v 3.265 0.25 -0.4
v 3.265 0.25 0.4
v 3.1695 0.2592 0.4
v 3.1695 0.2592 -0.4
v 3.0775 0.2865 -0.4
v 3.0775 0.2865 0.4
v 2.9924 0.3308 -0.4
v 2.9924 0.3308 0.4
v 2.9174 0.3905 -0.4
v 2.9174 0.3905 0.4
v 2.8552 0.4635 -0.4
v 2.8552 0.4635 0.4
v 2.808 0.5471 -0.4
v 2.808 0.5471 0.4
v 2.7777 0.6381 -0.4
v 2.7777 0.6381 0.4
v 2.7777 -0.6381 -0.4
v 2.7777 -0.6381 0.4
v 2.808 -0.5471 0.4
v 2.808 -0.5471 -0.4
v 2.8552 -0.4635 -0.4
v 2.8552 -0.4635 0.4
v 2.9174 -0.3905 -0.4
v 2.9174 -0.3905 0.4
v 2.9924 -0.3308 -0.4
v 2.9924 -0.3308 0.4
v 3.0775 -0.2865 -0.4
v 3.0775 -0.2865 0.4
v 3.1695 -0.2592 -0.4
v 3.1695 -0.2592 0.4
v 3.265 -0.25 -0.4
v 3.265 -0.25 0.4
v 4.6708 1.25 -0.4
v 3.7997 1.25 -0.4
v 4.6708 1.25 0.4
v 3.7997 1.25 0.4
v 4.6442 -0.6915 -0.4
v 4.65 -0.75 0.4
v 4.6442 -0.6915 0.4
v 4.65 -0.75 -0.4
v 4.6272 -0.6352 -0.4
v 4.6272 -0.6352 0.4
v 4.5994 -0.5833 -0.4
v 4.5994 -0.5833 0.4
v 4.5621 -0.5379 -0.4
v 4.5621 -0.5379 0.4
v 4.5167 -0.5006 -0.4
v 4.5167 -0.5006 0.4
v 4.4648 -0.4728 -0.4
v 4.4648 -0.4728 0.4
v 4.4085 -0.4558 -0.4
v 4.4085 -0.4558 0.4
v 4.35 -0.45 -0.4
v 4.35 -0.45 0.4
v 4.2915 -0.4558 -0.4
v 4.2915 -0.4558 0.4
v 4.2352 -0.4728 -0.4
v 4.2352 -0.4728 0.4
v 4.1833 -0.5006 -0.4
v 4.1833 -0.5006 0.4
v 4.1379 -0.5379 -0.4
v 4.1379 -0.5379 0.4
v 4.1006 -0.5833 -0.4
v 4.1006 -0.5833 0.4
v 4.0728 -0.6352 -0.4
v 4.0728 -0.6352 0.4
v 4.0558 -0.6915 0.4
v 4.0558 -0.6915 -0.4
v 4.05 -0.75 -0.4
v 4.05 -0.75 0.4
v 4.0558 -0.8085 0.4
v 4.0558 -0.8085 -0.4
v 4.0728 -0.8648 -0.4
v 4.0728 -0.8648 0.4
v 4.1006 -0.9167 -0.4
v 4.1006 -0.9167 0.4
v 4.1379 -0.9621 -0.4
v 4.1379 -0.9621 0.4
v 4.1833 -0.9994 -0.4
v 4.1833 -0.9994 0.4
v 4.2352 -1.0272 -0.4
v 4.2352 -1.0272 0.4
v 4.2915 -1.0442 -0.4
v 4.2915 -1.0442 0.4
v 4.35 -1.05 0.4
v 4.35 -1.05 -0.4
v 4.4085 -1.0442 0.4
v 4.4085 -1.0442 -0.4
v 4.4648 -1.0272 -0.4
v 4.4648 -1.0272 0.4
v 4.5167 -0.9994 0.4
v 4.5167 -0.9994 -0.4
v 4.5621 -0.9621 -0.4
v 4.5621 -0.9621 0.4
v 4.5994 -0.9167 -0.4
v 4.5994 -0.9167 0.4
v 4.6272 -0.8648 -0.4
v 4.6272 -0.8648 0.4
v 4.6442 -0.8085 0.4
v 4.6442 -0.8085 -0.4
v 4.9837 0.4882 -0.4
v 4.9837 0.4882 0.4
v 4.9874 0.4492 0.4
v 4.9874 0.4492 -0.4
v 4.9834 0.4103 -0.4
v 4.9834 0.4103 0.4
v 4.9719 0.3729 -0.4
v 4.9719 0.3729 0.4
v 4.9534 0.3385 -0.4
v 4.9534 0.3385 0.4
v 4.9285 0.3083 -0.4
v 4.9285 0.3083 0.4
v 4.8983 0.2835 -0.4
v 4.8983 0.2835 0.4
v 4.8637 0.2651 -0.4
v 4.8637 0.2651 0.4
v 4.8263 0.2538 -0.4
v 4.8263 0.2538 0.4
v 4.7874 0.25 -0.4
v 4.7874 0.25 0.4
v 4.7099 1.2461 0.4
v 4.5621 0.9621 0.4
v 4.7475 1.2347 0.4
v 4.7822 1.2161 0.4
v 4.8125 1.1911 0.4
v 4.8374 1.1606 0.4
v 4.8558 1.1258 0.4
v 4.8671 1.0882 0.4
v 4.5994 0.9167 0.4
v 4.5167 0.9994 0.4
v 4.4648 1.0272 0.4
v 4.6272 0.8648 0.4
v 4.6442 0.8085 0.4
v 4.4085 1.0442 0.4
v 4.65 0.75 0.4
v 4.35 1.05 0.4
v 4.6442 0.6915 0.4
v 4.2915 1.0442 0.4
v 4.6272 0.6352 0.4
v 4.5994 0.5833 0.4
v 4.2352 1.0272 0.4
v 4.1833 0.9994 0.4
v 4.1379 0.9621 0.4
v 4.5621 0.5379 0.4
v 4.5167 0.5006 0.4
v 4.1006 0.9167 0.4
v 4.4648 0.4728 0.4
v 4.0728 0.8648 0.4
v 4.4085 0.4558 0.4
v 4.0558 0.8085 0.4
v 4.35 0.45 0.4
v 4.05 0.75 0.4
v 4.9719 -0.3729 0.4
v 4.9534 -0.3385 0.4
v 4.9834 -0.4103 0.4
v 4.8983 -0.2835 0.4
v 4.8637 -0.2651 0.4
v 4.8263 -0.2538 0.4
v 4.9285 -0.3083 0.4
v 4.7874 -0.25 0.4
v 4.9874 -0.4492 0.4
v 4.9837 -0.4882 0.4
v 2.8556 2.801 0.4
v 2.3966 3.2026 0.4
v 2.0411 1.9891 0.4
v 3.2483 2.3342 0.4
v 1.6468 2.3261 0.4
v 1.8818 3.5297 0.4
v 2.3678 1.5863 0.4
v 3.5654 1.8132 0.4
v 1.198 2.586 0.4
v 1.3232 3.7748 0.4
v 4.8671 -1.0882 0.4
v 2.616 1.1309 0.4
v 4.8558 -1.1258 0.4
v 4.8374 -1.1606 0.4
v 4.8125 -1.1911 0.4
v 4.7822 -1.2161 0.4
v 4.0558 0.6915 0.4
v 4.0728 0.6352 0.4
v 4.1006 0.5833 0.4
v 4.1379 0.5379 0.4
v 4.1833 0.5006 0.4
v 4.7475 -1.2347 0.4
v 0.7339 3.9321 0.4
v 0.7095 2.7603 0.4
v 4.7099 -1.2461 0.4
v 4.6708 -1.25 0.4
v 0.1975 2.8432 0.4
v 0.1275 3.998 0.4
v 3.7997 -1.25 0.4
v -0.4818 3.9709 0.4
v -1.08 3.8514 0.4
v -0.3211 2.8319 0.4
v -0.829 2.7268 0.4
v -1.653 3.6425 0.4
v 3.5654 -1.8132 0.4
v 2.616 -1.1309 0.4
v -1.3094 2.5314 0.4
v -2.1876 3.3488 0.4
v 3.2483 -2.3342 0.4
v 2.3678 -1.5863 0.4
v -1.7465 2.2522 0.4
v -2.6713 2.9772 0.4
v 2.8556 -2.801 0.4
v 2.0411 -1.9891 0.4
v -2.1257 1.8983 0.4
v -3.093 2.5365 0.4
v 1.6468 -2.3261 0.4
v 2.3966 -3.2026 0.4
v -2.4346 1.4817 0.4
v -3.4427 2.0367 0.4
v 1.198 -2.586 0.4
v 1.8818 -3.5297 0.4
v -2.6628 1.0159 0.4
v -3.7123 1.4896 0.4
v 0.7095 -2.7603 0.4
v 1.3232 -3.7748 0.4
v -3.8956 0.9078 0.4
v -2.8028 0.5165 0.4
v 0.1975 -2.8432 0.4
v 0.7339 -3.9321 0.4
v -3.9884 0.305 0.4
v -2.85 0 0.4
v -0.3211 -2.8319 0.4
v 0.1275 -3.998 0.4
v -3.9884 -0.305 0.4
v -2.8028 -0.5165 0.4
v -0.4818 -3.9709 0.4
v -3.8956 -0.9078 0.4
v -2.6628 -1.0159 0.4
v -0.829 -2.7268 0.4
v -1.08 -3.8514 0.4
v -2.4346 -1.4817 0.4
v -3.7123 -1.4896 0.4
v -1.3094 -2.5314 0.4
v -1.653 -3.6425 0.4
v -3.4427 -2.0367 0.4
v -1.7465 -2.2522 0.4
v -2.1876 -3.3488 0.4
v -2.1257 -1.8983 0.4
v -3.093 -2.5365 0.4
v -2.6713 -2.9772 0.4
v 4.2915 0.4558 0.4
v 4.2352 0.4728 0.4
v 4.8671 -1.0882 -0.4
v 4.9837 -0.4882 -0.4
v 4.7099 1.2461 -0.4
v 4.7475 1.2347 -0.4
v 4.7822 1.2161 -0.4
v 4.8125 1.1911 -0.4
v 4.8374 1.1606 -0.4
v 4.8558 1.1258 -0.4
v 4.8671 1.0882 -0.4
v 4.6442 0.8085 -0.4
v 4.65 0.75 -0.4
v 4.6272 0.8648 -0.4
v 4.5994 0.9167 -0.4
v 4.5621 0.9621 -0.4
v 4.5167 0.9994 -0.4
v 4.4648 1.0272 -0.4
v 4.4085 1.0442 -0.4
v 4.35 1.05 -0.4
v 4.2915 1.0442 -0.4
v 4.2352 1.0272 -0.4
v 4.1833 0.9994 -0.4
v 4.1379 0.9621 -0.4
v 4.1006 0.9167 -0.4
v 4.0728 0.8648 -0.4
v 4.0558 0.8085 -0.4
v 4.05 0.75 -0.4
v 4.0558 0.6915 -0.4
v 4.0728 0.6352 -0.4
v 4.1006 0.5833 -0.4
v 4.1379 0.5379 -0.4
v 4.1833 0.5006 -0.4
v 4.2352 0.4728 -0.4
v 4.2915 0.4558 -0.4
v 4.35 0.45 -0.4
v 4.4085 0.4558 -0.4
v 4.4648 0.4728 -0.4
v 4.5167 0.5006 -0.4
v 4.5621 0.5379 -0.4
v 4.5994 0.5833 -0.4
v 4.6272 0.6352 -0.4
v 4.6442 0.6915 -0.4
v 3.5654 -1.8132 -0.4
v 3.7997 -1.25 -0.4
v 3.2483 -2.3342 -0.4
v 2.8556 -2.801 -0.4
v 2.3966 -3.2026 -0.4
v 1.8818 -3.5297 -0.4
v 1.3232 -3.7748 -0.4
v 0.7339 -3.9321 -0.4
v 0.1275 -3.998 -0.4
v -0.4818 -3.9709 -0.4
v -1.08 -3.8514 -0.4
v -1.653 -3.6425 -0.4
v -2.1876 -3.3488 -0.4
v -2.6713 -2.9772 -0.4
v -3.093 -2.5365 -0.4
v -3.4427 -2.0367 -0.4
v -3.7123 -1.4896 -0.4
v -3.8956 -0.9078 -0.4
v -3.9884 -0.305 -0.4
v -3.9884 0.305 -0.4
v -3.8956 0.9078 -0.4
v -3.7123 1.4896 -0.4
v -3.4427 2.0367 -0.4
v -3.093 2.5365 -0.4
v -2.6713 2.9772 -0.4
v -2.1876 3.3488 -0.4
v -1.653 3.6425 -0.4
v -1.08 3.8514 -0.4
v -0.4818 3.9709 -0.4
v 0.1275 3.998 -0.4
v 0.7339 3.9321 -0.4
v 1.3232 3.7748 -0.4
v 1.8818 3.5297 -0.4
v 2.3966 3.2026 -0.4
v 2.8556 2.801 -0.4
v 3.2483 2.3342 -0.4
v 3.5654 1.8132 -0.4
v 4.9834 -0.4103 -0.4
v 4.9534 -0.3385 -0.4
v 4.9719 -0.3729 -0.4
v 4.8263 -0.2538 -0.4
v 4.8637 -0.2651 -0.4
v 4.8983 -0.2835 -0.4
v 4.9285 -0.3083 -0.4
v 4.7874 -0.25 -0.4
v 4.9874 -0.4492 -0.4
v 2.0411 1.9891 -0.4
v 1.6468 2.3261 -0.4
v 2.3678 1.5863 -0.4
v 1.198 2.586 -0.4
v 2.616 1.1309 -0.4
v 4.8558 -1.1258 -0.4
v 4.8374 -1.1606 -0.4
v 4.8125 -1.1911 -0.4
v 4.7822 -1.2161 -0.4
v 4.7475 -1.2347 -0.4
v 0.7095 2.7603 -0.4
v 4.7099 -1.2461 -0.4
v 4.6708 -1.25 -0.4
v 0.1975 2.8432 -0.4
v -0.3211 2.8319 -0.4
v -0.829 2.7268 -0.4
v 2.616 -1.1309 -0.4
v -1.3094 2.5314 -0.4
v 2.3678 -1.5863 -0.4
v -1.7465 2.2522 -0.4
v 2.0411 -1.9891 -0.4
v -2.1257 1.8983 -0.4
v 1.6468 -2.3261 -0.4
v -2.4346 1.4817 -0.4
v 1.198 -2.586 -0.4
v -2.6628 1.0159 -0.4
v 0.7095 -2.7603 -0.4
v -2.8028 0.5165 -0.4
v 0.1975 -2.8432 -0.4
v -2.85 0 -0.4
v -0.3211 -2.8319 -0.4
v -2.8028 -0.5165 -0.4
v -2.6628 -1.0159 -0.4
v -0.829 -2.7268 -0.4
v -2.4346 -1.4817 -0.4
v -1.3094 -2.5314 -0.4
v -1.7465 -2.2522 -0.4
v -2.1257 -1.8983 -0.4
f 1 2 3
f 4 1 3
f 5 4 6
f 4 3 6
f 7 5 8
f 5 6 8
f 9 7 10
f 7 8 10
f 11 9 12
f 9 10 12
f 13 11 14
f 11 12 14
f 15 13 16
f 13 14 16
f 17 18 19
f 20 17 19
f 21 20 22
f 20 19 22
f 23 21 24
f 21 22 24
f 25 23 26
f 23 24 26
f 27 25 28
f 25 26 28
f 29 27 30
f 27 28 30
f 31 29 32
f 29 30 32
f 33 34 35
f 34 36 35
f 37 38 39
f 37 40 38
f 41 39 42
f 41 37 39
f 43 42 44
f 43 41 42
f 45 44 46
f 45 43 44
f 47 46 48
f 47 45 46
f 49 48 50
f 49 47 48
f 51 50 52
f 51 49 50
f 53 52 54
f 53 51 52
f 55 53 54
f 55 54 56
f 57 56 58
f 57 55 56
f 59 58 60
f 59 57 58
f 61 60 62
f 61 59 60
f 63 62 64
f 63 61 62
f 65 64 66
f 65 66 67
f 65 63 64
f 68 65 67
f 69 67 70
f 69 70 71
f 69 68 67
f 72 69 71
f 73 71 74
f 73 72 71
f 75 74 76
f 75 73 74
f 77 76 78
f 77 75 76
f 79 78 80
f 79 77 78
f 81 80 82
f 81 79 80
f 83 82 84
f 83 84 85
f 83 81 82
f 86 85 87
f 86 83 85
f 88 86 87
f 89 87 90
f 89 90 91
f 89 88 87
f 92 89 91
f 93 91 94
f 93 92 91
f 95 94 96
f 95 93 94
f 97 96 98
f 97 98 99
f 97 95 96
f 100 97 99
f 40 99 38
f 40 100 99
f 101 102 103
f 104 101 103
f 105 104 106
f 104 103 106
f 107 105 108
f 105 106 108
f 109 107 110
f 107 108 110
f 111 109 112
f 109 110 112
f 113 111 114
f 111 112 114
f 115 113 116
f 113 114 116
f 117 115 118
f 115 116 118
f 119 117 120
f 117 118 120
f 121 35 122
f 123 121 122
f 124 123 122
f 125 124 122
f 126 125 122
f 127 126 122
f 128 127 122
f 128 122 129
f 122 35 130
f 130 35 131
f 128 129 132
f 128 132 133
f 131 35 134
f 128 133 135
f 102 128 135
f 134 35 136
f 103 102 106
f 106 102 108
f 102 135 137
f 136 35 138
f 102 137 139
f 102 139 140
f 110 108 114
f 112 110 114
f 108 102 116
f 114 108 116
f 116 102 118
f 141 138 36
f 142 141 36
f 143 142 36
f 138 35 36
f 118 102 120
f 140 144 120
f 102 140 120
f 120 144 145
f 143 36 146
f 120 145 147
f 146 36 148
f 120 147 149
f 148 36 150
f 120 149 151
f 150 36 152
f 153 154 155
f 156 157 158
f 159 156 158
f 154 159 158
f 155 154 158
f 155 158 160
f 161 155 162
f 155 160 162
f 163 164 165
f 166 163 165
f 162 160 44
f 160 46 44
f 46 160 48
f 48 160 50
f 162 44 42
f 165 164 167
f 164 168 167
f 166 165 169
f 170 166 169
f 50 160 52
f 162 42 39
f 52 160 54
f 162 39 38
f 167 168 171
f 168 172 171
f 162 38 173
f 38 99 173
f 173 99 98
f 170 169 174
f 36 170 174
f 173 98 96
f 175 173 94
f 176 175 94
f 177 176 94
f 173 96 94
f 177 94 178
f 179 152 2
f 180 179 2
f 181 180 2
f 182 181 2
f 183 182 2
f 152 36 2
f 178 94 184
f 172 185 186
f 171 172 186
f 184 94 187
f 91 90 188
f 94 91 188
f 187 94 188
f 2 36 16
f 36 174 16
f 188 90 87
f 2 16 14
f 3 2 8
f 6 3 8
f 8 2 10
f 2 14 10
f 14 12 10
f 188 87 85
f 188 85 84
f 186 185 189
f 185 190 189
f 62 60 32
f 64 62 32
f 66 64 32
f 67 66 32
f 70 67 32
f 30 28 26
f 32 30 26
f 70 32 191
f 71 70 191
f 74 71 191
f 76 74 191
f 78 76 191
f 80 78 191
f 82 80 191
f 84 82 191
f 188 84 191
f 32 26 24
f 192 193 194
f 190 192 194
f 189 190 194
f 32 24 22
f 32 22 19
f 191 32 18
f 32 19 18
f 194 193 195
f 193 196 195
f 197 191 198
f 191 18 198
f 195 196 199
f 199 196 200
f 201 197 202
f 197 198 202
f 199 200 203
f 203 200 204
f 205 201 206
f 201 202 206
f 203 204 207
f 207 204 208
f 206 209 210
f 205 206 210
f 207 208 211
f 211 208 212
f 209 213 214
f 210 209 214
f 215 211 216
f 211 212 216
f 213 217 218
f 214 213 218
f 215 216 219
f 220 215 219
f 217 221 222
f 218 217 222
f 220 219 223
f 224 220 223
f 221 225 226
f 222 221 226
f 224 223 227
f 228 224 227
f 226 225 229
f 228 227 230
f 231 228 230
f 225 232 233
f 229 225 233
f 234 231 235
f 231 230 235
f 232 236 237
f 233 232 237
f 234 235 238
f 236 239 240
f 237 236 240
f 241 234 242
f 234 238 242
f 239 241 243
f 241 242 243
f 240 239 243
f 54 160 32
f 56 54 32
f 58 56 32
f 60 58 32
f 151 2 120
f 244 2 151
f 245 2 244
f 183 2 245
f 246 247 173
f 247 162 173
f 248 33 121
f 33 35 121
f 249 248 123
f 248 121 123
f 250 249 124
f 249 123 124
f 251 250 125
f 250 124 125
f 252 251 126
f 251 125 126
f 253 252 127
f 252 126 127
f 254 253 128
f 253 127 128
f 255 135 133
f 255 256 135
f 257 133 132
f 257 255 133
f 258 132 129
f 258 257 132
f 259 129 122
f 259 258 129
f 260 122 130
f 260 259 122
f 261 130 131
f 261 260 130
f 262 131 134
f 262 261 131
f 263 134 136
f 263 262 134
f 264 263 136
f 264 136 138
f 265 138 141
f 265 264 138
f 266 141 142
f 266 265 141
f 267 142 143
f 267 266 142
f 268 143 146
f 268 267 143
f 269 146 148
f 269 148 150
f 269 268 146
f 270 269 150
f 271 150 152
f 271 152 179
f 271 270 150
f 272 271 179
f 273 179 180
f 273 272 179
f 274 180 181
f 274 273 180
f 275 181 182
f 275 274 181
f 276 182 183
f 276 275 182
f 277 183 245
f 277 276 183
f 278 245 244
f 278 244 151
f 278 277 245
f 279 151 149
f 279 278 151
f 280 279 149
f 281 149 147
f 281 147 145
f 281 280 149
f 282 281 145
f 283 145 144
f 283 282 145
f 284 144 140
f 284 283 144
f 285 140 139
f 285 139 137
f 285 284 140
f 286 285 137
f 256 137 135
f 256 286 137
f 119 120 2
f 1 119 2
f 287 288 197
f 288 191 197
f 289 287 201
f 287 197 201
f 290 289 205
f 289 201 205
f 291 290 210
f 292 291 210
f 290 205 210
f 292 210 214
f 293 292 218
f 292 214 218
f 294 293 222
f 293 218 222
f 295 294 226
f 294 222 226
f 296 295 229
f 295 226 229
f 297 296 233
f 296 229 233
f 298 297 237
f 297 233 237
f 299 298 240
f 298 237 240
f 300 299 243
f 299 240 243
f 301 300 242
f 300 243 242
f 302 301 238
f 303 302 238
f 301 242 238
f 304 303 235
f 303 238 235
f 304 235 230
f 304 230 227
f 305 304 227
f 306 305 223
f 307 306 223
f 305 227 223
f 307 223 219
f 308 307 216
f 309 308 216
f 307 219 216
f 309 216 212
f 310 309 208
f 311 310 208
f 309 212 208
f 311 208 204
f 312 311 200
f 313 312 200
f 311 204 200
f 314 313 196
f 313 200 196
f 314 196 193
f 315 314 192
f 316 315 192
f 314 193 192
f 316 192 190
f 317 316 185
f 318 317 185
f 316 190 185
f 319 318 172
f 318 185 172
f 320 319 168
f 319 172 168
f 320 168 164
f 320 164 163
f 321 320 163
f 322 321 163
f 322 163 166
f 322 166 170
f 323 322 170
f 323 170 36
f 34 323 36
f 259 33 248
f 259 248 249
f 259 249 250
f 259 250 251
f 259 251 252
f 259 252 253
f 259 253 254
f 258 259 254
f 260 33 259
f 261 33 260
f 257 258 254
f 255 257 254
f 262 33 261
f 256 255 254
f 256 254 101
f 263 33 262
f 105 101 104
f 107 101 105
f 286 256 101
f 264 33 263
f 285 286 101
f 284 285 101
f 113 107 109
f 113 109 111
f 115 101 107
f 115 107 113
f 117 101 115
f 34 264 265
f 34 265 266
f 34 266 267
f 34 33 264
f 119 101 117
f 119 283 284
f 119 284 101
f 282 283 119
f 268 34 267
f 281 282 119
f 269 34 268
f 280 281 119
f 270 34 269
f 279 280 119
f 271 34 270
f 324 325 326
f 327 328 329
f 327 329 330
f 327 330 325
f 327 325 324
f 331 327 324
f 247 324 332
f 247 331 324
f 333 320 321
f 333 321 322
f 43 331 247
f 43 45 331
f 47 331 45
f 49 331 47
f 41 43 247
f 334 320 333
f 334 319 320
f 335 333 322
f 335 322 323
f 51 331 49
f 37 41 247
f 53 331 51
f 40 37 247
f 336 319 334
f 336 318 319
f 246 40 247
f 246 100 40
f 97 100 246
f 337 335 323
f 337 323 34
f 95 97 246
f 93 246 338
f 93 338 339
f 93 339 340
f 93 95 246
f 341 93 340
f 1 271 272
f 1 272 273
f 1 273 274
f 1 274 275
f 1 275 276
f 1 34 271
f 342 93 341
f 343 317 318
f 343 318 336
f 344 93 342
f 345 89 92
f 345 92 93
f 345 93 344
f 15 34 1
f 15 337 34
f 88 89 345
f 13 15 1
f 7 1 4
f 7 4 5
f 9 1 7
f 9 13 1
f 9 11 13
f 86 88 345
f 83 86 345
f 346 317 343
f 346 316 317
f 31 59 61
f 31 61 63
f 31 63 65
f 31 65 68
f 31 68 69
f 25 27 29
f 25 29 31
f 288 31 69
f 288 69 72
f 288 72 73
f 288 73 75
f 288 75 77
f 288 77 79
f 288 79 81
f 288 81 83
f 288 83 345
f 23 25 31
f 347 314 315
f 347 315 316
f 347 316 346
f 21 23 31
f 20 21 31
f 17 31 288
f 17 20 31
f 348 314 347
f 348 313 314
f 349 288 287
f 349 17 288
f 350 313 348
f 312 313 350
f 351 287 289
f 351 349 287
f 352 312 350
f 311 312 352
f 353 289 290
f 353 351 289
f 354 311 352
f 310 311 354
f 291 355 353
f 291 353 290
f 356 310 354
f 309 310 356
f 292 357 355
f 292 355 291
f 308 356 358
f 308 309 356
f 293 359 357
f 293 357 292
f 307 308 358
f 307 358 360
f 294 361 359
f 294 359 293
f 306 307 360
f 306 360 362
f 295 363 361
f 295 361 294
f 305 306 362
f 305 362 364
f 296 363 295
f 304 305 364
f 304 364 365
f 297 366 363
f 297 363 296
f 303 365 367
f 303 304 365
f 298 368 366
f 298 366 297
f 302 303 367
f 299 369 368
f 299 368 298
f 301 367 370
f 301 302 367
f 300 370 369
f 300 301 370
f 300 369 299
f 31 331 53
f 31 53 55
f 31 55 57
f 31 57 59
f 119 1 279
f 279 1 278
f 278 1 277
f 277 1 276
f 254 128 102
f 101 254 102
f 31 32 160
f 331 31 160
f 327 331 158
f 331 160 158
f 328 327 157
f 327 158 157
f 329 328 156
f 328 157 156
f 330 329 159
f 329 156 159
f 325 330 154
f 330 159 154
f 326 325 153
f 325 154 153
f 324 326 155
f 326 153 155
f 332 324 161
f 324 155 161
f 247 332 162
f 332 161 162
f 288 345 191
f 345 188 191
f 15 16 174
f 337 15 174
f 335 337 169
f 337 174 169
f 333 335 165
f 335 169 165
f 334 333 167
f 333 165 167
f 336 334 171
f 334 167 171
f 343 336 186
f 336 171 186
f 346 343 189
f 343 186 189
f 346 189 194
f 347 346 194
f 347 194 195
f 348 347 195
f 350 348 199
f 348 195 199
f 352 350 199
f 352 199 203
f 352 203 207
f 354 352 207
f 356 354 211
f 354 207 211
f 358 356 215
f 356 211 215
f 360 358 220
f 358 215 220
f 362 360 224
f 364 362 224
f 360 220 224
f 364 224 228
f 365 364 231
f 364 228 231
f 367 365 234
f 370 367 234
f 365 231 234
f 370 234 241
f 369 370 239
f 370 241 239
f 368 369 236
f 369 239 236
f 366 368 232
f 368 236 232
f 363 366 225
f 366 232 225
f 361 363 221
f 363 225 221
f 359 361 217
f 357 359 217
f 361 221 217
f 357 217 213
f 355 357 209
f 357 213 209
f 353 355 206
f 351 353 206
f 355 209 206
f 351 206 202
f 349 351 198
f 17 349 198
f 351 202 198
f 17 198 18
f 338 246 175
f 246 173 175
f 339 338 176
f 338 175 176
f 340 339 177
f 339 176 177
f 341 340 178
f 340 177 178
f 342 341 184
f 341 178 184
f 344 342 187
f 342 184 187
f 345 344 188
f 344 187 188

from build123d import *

# Parameters (mm, degrees)
SKETCH1_R           = 0.3
BOSS_EXTRUDE1_DEPTH = 0.4


with BuildPart() as part:
    # Sketch1 → Boss-Extrude1 (new, symmetric)
    with BuildSketch(Plane(origin=(0, 0, 0), x_dir=(0, 1, 0), z_dir=(0, 0, 1))):
        with BuildLine():
            Line((-0.25, -3.264965543), (-0.25, -4.787380599))
            ThreePointArc((-0.25, -4.787380599), (-0.322784356, -4.941705516), (-0.488161799, -4.983706036))
            Line((-0.488161799, -4.983706036), (-1.088161799, -4.86707785))
            ThreePointArc((-1.088161799, -4.86707785), (-1.204324917, -4.797968058), (-1.25, -4.670752414))
            Line((-1.25, -4.670752414), (-1.25, -3.799671038))
            ThreePointArc((-1.25, -3.799671038), (0, 4), (1.25, -3.799671038))
            Line((1.25, -3.799671038), (1.25, -4.670752414))
            ThreePointArc((1.25, -4.670752414), (1.204324917, -4.797968058), (1.088161799, -4.86707785))
            Line((1.088161799, -4.86707785), (0.488161799, -4.983706036))
            ThreePointArc((0.488161799, -4.983706036), (0.322784356, -4.941705516), (0.25, -4.787380599))
            Line((0.25, -4.787380599), (0.25, -3.264965543))
            ThreePointArc((0.25, -3.264965543), (0.358866935, -2.953493353), (0.638059701, -2.777657253))
            ThreePointArc((0.638059701, -2.777657253), (0, 2.85), (-0.638059701, -2.777657253))
            ThreePointArc((-0.638059701, -2.777657253), (-0.358866935, -2.953493353), (-0.25, -3.264965543))
        make_face()
        with Locations(Location((0.75, -4.35, 0), (0, 0, 270))):
            Circle(SKETCH1_R, mode=Mode.SUBTRACT)
        with Locations(Location((-0.75, -4.35, 0), (0, 0, 270))):
            Circle(SKETCH1_R, mode=Mode.SUBTRACT)
    extrude(amount=BOSS_EXTRUDE1_DEPTH, both=True)


solid = part.part
